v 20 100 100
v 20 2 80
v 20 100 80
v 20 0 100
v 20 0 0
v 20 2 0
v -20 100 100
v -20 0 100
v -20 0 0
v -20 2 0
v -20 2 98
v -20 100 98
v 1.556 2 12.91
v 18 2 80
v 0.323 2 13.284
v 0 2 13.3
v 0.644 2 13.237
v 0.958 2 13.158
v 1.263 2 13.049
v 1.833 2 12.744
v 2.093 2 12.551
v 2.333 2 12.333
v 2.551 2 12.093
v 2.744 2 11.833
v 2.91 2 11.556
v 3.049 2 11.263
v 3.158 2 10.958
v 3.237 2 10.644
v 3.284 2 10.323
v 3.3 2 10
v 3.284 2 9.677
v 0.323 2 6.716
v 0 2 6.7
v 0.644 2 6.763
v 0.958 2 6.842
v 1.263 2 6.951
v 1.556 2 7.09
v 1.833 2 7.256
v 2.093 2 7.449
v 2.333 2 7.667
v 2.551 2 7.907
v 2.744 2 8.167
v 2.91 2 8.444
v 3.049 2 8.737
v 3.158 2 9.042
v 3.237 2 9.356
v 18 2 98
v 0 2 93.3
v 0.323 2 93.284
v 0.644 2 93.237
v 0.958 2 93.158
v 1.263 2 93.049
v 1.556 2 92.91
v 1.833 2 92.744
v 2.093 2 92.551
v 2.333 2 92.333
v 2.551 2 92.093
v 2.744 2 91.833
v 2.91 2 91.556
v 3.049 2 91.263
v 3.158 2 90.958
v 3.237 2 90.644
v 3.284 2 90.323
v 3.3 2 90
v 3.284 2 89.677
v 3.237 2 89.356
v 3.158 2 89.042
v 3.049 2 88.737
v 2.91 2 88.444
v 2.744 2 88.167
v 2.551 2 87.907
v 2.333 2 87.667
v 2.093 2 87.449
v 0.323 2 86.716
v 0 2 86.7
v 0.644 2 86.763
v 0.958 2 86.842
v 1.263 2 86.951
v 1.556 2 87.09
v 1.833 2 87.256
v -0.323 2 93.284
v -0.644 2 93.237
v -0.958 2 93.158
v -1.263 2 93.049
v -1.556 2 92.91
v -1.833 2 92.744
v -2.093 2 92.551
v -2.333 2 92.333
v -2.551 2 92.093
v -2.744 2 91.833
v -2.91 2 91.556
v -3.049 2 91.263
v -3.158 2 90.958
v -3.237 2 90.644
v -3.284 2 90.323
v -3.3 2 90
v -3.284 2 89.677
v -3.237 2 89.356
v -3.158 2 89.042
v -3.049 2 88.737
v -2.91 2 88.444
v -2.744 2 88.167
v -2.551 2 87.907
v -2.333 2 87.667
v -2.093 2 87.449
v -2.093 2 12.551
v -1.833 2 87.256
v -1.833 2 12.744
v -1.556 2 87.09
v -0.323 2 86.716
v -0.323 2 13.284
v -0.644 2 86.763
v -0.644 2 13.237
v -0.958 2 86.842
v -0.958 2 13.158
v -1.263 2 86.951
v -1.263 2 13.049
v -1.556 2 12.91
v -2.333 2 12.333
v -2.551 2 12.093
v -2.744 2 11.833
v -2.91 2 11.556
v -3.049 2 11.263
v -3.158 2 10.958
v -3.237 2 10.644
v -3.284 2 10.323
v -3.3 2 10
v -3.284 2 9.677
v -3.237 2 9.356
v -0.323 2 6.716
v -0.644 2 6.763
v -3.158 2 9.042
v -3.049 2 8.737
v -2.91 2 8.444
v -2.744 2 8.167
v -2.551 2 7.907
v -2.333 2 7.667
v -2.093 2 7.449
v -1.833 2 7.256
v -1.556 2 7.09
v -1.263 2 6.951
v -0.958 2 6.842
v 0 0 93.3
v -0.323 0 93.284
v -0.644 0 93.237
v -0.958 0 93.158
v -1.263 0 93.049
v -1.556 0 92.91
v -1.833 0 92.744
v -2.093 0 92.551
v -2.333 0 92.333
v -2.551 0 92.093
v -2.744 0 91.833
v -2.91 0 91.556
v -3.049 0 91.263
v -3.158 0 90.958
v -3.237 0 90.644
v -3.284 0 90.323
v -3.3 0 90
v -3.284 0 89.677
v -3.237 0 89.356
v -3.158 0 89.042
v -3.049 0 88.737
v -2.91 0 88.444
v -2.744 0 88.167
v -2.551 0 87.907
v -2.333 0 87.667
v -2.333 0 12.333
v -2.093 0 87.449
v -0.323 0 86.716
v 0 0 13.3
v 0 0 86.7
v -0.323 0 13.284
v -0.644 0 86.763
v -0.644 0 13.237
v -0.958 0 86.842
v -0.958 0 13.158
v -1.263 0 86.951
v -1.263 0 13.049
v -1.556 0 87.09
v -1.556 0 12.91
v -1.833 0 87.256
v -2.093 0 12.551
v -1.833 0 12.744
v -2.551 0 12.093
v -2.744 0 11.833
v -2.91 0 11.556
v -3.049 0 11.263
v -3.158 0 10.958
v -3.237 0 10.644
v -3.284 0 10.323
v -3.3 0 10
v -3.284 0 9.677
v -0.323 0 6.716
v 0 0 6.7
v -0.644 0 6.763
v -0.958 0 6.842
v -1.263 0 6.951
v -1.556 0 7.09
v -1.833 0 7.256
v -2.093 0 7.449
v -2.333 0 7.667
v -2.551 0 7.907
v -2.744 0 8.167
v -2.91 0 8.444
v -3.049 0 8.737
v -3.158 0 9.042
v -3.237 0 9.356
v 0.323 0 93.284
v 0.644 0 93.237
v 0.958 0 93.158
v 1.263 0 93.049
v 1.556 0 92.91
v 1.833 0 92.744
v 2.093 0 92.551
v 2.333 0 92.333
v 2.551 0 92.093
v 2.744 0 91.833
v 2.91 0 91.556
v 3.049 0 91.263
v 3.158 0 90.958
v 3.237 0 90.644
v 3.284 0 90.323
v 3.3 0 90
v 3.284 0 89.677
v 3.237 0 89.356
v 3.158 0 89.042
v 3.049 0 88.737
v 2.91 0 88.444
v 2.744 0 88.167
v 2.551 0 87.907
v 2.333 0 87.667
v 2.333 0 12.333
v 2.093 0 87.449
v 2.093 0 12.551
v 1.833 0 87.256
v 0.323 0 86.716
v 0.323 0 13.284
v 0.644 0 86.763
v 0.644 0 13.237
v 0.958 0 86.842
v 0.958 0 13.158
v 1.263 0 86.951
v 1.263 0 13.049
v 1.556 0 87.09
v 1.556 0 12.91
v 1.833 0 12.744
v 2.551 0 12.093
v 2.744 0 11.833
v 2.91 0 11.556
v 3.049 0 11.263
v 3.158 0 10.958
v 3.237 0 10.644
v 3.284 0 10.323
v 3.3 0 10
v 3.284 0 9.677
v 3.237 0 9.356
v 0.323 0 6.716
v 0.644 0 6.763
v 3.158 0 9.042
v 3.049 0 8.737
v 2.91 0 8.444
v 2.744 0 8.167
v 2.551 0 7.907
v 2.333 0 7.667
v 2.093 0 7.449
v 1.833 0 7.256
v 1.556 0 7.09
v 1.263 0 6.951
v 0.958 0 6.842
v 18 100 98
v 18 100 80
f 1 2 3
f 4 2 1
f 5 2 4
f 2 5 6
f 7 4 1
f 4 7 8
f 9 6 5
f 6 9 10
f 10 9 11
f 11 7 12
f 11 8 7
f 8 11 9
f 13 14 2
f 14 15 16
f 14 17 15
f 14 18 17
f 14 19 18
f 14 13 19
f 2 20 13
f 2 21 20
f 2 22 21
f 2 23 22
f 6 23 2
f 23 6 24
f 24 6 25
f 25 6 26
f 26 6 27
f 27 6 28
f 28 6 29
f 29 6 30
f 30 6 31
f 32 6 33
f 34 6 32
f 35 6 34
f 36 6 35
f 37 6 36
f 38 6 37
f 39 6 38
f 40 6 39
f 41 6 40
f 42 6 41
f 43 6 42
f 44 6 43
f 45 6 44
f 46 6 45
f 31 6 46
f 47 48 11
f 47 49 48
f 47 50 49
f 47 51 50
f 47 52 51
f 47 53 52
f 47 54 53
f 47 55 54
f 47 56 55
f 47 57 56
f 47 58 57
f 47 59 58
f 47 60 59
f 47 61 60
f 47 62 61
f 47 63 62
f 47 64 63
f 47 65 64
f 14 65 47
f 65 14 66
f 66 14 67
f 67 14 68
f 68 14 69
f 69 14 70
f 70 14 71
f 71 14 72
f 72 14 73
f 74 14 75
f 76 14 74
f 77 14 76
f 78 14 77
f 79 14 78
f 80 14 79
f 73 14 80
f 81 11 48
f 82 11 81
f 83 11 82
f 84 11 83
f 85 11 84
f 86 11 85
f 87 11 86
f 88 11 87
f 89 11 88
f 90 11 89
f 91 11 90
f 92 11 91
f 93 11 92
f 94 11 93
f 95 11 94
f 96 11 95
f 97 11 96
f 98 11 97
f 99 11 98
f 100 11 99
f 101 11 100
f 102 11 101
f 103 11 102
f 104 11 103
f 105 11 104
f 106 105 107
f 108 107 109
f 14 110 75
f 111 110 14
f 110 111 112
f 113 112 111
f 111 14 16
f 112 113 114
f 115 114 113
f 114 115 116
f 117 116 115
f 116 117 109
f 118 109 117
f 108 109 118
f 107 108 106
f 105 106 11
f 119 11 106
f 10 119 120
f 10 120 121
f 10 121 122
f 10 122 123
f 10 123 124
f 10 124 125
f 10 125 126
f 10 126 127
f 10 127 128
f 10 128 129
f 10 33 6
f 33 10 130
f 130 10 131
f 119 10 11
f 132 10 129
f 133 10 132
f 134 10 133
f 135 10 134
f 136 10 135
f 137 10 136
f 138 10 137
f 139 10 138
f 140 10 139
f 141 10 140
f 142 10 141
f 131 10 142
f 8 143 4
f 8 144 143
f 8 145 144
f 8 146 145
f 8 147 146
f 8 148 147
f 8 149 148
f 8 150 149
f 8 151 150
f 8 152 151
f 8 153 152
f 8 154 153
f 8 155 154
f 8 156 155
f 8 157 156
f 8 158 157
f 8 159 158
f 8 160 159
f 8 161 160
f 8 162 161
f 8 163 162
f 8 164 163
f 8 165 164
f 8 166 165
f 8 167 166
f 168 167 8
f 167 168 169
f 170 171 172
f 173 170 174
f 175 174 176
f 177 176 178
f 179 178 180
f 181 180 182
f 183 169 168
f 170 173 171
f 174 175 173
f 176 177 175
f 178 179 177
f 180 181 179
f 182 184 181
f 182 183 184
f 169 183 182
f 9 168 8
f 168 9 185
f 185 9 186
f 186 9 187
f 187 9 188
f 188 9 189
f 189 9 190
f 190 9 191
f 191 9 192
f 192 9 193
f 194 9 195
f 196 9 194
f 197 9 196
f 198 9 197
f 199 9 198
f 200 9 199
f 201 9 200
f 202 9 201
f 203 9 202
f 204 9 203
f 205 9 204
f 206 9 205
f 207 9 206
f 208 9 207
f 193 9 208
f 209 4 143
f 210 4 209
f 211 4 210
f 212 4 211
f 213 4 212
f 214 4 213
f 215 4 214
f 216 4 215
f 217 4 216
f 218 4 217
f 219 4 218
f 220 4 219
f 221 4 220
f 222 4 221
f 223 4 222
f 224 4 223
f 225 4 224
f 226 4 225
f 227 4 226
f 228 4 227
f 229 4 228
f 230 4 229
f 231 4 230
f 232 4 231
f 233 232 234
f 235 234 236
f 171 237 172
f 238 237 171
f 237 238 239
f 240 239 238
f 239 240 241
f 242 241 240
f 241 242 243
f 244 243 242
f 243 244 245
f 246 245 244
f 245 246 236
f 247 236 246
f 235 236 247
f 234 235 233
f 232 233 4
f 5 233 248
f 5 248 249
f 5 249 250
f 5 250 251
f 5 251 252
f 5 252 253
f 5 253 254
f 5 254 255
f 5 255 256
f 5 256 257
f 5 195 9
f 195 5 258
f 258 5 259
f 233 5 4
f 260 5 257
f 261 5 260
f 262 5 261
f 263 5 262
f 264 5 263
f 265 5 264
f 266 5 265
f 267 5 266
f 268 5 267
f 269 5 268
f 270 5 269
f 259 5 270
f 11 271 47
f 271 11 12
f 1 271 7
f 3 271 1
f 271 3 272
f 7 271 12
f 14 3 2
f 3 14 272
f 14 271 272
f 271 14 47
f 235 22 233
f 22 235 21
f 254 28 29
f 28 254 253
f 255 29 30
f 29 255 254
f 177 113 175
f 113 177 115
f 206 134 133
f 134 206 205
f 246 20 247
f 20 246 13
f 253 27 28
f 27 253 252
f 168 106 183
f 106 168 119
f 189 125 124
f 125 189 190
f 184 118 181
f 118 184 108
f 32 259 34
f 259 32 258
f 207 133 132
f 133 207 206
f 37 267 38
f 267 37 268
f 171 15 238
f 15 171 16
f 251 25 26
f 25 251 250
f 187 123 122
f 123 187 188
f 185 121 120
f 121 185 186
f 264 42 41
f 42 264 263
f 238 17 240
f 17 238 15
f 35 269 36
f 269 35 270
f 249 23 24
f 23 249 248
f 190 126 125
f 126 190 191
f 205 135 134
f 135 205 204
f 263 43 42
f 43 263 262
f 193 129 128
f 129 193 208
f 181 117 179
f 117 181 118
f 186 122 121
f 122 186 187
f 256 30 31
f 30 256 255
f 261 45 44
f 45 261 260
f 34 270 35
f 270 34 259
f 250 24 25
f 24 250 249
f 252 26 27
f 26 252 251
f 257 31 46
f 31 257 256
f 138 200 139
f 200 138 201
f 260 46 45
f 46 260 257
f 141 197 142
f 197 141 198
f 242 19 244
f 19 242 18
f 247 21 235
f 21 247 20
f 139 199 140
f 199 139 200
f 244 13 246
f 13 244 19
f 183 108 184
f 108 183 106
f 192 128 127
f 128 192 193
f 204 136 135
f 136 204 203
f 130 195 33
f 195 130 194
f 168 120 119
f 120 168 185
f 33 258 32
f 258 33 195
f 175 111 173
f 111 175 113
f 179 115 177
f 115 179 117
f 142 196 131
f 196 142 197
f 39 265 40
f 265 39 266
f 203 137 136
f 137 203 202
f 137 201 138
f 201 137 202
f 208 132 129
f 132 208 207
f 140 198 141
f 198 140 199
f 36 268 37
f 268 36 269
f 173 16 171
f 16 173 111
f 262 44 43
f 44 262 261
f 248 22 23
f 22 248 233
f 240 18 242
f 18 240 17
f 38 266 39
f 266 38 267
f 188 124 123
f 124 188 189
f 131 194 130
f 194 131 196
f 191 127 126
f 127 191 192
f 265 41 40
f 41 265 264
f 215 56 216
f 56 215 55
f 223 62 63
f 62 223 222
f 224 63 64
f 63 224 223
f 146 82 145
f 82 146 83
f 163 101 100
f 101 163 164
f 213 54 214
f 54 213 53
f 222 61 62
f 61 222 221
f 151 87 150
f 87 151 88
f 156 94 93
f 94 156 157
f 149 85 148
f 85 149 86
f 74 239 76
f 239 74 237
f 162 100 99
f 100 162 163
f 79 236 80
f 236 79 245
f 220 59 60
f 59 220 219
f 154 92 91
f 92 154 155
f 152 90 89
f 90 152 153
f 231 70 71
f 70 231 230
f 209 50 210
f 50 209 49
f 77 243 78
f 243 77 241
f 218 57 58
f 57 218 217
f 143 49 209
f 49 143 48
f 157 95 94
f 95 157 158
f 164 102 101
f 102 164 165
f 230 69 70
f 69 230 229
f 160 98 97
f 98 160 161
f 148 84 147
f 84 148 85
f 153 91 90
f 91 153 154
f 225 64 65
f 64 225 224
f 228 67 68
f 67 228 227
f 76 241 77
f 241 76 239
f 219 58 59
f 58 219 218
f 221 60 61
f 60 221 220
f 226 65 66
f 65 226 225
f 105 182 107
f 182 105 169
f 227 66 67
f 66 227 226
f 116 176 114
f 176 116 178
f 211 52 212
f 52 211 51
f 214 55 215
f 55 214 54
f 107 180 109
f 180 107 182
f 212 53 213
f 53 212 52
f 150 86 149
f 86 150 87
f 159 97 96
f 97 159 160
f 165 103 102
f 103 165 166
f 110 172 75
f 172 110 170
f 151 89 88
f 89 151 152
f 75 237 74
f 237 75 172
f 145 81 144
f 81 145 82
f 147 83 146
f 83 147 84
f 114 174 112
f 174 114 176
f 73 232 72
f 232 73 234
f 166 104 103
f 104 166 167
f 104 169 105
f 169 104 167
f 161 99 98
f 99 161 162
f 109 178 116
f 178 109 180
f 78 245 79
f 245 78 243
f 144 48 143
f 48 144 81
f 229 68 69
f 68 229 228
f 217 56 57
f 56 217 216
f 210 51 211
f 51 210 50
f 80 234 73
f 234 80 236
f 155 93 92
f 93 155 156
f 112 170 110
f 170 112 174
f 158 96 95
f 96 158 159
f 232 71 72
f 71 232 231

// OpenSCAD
// MB001-R01 wall bracket - simplified OpenSCAD model.
//
// Same part as mb001_bracket.py (CadQuery). Shows the code-based CAD path
// from AGENTS.md section 5. OpenSCAD is free for Windows, macOS and Linux.
// Run:  openscad -o MB001-R01.stl mb001_bracket.scad
// (OpenSCAD exports STL/3MF, not STEP; use the CadQuery model for STEP.)
//
// Simplified: no bend radius, no rail cut-out, no bend relief. A real
// sheet-metal part is modelled with the CAD program's sheet-metal tools (DFM-45).

T        = 2;      // sheet thickness, mm (requirements: S235, 2 mm)
WIDTH    = 40;     // bracket width
WALL_H   = 100;    // wall leg height
ARM_L    = 100;    // shelf arm length
FLANGE_H = 20;     // load flange height (review.md F-003)
HOLE_D   = 6.6;    // wall screw clearance
HOLE_Z   = [10, 90];  // 80 mm apart; upper hole 10 mm from the bend (DFM-43)

$fn = 64;

difference() {
    union() {
        // Wall leg: vertical plate, thickness along +Y.
        translate([-WIDTH / 2, 0, 0]) cube([WIDTH, T, WALL_H]);
        // Shelf arm: horizontal plate on top of the wall leg.
        translate([-WIDTH / 2, 0, WALL_H - T]) cube([WIDTH, ARM_L, T]);
        // Load flange: vertical strip under one edge of the arm.
        translate([WIDTH / 2 - T, T, WALL_H - FLANGE_H]) cube([T, ARM_L - T, FLANGE_H]);
    }
    // Two screw holes through the wall leg.
    for (z = HOLE_Z)
        translate([0, T / 2, z]) rotate([90, 0, 0])
            cylinder(d = HOLE_D, h = 4 * T, center = true);
}
